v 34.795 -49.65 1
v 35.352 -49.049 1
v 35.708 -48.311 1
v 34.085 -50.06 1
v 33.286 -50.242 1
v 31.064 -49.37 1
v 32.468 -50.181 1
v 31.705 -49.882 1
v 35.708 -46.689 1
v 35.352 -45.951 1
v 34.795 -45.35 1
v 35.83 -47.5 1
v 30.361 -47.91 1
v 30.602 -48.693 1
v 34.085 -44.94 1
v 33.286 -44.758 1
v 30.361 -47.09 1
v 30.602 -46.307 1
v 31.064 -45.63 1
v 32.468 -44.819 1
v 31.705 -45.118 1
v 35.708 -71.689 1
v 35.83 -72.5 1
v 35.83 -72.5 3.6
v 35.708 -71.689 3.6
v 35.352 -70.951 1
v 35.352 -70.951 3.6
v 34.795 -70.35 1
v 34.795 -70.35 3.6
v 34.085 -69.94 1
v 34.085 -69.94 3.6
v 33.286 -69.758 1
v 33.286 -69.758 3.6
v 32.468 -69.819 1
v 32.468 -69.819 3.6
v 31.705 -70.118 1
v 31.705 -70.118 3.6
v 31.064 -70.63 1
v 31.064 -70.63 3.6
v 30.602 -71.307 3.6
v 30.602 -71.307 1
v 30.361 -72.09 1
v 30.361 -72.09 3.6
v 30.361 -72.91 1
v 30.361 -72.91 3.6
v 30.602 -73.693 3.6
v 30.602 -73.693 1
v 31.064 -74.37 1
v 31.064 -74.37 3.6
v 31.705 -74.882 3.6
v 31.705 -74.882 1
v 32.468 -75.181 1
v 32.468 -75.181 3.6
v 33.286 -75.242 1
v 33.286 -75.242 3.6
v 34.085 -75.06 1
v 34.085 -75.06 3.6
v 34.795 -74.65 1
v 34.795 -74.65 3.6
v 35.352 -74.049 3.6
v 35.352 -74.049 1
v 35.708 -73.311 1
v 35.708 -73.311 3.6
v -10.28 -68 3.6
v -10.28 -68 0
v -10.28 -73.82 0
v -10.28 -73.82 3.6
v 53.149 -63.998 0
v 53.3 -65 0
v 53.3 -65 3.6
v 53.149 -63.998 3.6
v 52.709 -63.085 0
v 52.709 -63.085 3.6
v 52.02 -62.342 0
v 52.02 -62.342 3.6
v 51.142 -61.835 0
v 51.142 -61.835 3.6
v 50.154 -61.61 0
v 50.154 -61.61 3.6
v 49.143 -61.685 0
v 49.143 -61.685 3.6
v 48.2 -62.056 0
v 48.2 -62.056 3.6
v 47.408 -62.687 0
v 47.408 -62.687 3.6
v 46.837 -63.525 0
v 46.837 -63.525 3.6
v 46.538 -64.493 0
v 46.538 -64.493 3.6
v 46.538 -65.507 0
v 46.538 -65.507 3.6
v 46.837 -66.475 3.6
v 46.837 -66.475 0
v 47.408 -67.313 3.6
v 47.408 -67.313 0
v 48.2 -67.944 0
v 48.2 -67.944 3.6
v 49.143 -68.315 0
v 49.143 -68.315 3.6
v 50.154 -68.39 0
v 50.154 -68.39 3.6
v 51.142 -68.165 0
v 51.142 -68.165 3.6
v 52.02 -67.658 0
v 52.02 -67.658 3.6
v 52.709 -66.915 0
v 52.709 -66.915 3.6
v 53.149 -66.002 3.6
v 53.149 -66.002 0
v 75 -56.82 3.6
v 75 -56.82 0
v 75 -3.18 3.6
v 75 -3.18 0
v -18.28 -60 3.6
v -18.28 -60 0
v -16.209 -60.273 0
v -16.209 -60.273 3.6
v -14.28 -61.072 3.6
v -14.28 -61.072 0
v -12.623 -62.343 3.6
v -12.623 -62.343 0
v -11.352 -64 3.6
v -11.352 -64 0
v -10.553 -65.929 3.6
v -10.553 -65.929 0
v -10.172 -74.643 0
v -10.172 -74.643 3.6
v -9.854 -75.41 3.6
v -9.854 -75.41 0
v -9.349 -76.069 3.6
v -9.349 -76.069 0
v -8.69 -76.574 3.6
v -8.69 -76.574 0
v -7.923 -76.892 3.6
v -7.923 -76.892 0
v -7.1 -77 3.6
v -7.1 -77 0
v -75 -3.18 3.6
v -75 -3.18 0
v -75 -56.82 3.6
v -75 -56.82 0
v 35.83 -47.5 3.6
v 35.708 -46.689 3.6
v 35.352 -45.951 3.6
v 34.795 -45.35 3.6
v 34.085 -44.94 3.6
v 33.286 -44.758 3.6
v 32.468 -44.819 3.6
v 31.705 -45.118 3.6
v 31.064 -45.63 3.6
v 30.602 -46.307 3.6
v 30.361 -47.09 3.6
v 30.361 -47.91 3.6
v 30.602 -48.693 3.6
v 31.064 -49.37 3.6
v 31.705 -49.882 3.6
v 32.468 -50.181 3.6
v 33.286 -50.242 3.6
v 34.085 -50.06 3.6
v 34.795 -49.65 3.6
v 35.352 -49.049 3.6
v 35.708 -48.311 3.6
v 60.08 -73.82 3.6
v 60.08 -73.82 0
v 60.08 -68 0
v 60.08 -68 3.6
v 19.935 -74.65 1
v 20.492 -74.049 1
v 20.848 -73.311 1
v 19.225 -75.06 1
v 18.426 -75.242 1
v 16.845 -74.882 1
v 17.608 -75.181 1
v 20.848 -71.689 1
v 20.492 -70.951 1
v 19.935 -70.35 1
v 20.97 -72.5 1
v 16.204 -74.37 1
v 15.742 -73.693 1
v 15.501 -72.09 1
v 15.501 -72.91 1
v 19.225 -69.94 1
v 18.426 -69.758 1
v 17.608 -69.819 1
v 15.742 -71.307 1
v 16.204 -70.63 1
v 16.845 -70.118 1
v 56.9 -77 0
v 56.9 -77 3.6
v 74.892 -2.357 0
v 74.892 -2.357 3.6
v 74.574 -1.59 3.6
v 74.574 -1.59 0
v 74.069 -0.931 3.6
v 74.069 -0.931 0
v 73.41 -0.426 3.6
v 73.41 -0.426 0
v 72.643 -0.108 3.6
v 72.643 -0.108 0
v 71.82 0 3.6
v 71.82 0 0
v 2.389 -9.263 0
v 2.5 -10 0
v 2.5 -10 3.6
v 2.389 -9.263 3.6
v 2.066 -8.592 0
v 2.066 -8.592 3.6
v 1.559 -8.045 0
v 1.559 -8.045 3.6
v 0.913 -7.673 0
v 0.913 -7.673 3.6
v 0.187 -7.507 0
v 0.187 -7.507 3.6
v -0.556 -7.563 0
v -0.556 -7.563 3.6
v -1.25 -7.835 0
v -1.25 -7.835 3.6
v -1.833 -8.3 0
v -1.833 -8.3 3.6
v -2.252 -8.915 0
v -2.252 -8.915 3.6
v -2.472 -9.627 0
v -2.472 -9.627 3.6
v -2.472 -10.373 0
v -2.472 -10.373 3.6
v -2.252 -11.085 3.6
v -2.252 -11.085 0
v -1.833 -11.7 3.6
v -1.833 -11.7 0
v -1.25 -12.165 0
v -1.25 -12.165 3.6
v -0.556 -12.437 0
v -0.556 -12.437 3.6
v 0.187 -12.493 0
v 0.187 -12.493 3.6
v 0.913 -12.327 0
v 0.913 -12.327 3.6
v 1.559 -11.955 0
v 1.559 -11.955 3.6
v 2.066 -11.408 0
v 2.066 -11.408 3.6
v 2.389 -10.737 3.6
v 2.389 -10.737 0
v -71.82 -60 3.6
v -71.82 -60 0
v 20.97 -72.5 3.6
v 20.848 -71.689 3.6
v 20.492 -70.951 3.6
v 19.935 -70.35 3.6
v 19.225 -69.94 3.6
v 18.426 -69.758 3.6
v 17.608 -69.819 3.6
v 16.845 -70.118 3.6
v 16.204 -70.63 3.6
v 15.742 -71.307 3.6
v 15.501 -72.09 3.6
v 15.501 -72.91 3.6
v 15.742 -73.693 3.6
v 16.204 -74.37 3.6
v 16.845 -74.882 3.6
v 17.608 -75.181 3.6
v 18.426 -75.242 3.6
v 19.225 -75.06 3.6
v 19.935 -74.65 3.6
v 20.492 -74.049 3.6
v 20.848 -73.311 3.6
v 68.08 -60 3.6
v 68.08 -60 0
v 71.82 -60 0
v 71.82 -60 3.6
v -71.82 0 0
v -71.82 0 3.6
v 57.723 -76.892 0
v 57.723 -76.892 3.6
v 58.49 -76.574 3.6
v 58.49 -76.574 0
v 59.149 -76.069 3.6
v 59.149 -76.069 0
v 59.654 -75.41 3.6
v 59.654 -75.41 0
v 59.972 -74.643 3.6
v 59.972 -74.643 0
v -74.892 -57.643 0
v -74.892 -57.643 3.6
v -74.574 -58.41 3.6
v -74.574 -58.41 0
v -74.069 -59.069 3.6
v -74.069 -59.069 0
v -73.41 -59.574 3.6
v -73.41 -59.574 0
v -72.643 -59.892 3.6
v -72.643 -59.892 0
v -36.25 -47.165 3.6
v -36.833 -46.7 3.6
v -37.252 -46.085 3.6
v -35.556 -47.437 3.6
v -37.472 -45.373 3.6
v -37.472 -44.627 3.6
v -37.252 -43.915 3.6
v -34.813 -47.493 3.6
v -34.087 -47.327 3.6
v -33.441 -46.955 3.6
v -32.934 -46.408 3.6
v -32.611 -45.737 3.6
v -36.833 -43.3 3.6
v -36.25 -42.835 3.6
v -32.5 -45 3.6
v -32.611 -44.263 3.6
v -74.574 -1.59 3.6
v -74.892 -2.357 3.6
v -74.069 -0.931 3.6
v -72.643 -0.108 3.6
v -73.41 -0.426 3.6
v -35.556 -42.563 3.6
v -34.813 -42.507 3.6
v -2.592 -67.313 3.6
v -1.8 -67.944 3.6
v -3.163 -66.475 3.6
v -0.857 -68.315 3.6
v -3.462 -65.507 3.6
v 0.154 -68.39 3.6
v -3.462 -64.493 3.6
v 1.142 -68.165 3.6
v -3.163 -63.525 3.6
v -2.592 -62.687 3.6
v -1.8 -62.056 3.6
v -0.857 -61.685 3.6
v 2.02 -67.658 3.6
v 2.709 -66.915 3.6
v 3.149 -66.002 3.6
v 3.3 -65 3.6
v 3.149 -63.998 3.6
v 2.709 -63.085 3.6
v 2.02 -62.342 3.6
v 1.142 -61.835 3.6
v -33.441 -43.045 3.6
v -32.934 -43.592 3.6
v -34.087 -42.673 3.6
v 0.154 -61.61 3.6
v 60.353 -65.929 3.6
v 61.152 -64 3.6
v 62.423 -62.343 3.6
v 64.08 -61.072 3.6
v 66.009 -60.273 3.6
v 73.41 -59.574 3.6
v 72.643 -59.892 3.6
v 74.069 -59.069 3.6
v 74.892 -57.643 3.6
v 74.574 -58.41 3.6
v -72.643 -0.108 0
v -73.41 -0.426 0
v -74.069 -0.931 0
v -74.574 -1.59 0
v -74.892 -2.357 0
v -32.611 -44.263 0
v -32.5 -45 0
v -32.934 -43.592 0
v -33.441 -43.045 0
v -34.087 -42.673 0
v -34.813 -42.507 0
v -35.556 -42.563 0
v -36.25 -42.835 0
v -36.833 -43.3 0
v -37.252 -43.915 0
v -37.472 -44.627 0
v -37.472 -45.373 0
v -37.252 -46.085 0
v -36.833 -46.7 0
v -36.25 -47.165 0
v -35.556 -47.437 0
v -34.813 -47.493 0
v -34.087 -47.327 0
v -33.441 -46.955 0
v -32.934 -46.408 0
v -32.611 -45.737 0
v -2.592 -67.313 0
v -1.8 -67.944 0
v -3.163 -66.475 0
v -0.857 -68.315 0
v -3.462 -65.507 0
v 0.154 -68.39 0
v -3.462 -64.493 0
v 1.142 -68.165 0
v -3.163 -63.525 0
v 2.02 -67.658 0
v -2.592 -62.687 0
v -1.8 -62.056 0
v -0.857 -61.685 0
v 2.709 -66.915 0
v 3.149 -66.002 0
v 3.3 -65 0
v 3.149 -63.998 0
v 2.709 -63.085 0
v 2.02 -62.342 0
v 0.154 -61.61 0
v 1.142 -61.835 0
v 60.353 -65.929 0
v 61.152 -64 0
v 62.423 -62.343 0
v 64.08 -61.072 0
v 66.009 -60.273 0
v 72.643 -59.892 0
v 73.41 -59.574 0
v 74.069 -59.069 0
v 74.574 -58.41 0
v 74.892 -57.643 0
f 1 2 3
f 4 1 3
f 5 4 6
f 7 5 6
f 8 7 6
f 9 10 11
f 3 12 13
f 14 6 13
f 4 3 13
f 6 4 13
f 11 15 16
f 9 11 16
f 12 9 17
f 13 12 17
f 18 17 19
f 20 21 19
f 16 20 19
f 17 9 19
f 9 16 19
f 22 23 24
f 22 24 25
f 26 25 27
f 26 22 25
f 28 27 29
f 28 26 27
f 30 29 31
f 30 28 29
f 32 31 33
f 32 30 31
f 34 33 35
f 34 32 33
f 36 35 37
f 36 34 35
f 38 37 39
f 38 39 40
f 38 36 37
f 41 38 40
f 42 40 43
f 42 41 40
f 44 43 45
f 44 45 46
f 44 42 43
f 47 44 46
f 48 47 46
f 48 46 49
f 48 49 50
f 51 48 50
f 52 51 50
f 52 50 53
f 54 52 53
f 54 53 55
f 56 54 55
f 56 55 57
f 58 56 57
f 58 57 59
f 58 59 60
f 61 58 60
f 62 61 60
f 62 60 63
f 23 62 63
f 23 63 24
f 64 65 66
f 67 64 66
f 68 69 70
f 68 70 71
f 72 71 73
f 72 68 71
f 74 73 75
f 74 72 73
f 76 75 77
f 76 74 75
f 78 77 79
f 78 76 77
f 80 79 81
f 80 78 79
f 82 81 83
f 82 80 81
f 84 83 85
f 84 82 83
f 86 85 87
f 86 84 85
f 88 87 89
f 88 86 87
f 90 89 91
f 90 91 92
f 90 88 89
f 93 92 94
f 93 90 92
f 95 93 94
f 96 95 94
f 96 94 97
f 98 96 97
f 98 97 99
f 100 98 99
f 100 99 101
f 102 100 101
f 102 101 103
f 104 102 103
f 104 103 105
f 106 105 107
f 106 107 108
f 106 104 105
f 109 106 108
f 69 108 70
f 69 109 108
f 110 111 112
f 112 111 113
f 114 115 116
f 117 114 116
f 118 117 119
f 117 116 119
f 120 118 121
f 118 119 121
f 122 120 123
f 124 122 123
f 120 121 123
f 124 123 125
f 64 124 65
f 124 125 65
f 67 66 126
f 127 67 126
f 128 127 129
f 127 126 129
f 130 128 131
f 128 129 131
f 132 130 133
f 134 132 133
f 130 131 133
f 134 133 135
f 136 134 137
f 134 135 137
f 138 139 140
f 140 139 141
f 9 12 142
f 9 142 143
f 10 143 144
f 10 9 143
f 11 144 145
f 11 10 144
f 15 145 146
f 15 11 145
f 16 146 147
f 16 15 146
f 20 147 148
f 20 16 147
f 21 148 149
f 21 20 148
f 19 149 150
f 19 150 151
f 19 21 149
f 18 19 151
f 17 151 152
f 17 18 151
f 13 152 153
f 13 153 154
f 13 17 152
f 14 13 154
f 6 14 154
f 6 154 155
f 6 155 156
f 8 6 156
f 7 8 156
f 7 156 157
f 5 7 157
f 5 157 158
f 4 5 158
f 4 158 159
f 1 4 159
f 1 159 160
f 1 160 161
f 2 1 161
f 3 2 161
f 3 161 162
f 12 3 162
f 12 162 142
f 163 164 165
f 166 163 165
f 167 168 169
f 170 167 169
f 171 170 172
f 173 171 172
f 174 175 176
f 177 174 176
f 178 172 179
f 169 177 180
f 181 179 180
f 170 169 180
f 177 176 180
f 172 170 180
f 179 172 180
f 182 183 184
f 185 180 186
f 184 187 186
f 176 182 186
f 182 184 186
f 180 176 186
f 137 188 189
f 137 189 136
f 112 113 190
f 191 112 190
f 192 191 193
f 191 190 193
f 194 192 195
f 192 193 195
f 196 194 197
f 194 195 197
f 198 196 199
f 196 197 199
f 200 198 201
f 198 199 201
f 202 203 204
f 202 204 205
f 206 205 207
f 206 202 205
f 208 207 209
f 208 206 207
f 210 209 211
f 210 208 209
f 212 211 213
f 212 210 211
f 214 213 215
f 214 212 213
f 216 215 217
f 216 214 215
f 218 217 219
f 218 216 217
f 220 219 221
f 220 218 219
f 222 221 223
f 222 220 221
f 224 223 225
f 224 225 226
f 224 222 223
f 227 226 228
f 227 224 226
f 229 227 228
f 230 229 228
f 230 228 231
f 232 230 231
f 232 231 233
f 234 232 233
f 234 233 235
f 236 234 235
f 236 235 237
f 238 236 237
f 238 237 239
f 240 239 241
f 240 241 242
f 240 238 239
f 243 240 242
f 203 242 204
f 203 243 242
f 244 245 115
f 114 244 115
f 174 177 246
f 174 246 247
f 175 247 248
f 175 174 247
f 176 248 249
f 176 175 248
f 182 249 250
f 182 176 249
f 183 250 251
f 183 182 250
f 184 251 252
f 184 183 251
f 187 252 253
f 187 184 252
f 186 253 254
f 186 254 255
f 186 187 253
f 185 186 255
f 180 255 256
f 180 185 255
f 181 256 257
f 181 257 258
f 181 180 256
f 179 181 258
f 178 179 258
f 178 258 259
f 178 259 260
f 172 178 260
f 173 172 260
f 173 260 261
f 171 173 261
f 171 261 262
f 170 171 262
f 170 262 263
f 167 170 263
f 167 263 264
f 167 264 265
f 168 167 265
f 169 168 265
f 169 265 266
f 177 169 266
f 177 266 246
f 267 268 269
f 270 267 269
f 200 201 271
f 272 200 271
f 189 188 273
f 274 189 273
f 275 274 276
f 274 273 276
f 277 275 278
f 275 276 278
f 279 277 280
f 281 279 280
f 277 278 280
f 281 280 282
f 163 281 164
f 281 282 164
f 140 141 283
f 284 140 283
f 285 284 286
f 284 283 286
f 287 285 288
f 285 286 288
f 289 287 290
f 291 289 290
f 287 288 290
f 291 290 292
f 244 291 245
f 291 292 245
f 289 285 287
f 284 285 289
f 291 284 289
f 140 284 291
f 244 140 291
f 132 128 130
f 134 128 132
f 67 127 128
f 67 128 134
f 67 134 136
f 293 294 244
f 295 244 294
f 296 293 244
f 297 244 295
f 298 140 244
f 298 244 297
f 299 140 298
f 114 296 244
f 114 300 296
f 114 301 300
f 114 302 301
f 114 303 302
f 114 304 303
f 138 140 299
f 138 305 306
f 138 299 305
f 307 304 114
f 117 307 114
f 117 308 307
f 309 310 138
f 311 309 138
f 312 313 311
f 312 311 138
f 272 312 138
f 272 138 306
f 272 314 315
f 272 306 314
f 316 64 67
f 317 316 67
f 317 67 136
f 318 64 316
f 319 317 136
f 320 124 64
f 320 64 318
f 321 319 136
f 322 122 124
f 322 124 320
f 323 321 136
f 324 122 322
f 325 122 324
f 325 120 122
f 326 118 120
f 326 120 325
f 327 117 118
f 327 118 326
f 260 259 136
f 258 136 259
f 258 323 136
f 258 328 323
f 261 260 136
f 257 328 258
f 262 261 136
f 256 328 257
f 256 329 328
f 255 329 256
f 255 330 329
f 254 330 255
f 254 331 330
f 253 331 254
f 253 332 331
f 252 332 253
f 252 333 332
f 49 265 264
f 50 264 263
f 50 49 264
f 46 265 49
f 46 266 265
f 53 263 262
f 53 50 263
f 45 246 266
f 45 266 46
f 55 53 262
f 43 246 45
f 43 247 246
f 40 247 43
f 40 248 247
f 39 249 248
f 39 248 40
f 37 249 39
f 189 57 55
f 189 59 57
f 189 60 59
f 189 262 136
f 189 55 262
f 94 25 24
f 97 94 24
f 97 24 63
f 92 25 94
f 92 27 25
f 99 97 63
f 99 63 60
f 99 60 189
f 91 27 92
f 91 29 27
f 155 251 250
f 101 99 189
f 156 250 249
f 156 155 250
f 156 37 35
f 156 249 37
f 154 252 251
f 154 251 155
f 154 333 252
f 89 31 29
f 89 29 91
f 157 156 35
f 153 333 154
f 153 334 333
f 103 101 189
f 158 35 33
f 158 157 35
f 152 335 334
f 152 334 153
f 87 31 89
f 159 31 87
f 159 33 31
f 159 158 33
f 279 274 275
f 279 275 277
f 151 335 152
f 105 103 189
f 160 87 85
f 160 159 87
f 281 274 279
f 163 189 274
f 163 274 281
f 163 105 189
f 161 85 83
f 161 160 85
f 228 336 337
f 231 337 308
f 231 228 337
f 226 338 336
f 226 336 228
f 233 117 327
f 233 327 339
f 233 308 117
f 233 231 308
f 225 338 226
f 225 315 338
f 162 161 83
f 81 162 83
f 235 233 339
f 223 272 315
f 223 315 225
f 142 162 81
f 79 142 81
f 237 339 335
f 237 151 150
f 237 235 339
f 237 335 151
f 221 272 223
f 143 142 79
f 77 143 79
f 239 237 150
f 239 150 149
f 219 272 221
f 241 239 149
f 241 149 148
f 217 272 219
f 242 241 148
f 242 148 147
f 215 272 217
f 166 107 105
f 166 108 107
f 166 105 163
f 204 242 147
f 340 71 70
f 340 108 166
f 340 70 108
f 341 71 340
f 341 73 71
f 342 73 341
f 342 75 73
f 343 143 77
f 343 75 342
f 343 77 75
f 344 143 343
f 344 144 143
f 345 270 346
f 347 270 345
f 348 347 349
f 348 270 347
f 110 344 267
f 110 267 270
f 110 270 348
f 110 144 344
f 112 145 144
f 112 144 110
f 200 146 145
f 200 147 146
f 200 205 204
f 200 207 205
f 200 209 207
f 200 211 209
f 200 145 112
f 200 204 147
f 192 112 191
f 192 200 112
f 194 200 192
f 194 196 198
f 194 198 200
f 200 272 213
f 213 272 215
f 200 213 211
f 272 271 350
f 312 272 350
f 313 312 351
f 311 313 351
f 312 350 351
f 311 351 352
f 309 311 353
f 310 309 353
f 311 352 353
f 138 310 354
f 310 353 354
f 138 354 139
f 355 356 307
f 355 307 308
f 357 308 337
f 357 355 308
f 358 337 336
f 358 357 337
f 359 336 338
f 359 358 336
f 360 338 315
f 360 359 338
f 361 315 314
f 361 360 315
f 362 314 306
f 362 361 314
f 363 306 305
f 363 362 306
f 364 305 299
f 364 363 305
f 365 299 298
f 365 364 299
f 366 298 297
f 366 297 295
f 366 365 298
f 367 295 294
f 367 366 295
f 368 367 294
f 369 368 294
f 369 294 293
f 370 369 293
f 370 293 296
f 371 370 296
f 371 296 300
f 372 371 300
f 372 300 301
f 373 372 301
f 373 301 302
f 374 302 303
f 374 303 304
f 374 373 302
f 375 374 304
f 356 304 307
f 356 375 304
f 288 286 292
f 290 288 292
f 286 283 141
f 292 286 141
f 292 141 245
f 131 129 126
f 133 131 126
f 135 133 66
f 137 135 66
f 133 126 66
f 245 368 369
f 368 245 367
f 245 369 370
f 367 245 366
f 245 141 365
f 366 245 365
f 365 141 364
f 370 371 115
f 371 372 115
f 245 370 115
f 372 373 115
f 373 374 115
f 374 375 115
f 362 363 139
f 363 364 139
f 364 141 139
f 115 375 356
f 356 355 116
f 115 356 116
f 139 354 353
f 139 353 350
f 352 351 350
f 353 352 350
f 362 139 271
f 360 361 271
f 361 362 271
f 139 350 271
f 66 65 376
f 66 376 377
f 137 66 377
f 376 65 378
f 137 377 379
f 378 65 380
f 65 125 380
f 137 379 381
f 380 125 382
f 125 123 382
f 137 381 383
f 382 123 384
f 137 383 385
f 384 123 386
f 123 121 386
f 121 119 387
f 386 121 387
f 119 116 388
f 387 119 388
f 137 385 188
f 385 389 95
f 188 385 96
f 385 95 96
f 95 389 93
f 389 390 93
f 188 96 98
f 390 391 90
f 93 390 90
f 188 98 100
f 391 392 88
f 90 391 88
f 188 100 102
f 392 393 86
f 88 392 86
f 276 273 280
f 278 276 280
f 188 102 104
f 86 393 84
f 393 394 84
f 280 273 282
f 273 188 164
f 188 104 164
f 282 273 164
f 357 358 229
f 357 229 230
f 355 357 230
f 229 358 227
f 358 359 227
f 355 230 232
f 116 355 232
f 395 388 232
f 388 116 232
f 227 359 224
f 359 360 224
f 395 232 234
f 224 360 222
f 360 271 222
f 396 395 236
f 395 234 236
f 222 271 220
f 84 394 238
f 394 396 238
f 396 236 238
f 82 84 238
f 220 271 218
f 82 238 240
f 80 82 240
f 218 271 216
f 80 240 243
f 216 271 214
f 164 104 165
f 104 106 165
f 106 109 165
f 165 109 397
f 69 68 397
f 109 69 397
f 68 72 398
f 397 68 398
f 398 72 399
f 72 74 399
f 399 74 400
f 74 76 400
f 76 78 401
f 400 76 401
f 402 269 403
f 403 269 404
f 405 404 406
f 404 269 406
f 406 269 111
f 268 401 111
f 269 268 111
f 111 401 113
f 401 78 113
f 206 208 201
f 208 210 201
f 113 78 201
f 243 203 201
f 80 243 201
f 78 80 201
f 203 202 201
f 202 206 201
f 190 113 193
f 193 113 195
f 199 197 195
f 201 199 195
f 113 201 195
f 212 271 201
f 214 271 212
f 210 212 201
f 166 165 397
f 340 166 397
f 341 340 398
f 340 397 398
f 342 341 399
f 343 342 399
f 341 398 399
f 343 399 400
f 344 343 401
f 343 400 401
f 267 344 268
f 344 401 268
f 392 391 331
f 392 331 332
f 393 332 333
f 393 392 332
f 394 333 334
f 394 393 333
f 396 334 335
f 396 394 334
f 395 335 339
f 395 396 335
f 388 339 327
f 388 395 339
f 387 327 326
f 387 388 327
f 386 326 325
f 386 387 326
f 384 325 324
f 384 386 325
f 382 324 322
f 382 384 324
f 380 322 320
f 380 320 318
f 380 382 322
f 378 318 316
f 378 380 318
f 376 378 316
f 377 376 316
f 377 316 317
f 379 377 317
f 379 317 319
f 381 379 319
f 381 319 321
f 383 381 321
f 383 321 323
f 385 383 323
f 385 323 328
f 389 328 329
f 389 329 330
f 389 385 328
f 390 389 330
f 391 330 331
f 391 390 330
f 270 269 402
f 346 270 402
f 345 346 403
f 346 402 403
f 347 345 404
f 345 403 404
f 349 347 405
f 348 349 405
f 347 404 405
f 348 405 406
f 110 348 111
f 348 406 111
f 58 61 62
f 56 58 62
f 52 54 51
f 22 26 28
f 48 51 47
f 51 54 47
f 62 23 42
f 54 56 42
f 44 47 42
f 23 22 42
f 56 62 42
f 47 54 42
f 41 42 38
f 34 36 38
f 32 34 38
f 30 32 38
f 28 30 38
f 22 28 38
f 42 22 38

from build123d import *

# Parameters (mm, degrees)
SKETCH1_R           = 2.5
SKETCH1_R_2         = 3.4
SKETCH1_R_3         = 2.75
BOSS_EXTRUDE1_DEPTH = 3.6
SKETCH3_W           = 22.86
SKETCH3_H           = 34.5
BOSS_EXTRUDE3_DEPTH = 1


with BuildPart() as part:
    # Sketch1 → Boss-Extrude1 (new body)
    with BuildSketch(Plane.XY):
        with BuildLine():
            Line((71.82, 0), (-71.82, 0))
            ThreePointArc((-71.82, 0), (-74.068599564, -0.931400436), (-75, -3.18))
            Line((-75, -3.18), (-75, -56.82))
            ThreePointArc((-75, -56.82), (-74.068599564, -59.068599564), (-71.82, -60))
            Line((-71.82, -60), (-18.28, -60))
            ThreePointArc((-18.28, -60), (-12.623145751, -62.343145751), (-10.28, -68))
            Line((-10.28, -68), (-10.28, -73.82))
            ThreePointArc((-10.28, -73.82), (-9.348599564, -76.068599564), (-7.1, -77))
            Line((-7.1, -77), (56.9, -77))
            ThreePointArc((56.9, -77), (59.148599564, -76.068599564), (60.08, -73.82))
            Line((60.08, -73.82), (60.08, -68))
            ThreePointArc((60.08, -68), (62.423145751, -62.343145751), (68.08, -60))
            Line((68.08, -60), (71.82, -60))
            ThreePointArc((71.82, -60), (74.068599564, -59.068599564), (75, -56.82))
            Line((75, -56.82), (75, -3.18))
            ThreePointArc((75, -3.18), (74.068599564, -0.931400436), (71.82, 0))
        make_face()
        with Locations((-35, -45)):
            Circle(SKETCH1_R, mode=Mode.SUBTRACT)
        with Locations((0, -10)):
            Circle(SKETCH1_R, mode=Mode.SUBTRACT)
        with Locations((-0.1, -65)):
            Circle(SKETCH1_R_2, mode=Mode.SUBTRACT)
        with Locations((49.9, -65)):
            Circle(SKETCH1_R_2, mode=Mode.SUBTRACT)
        with Locations((33.08, -72.5)):
            Circle(SKETCH1_R_3, mode=Mode.SUBTRACT)
        with Locations((18.22, -72.5)):
            Circle(SKETCH1_R_3, mode=Mode.SUBTRACT)
        with Locations((33.08, -47.5)):
            Circle(SKETCH1_R_3, mode=Mode.SUBTRACT)
    extrude(amount=BOSS_EXTRUDE1_DEPTH)

    # Sketch3 → Boss-Extrude3 (add)
    with BuildSketch(Plane(origin=(0, 0, 0), x_dir=(-1, 0, 0), z_dir=(0, 0, -1))):
        with Locations((-25.65, -59.75)):
            Rectangle(SKETCH3_W, SKETCH3_H)
    extrude(amount=-BOSS_EXTRUDE3_DEPTH)


solid = part.part
